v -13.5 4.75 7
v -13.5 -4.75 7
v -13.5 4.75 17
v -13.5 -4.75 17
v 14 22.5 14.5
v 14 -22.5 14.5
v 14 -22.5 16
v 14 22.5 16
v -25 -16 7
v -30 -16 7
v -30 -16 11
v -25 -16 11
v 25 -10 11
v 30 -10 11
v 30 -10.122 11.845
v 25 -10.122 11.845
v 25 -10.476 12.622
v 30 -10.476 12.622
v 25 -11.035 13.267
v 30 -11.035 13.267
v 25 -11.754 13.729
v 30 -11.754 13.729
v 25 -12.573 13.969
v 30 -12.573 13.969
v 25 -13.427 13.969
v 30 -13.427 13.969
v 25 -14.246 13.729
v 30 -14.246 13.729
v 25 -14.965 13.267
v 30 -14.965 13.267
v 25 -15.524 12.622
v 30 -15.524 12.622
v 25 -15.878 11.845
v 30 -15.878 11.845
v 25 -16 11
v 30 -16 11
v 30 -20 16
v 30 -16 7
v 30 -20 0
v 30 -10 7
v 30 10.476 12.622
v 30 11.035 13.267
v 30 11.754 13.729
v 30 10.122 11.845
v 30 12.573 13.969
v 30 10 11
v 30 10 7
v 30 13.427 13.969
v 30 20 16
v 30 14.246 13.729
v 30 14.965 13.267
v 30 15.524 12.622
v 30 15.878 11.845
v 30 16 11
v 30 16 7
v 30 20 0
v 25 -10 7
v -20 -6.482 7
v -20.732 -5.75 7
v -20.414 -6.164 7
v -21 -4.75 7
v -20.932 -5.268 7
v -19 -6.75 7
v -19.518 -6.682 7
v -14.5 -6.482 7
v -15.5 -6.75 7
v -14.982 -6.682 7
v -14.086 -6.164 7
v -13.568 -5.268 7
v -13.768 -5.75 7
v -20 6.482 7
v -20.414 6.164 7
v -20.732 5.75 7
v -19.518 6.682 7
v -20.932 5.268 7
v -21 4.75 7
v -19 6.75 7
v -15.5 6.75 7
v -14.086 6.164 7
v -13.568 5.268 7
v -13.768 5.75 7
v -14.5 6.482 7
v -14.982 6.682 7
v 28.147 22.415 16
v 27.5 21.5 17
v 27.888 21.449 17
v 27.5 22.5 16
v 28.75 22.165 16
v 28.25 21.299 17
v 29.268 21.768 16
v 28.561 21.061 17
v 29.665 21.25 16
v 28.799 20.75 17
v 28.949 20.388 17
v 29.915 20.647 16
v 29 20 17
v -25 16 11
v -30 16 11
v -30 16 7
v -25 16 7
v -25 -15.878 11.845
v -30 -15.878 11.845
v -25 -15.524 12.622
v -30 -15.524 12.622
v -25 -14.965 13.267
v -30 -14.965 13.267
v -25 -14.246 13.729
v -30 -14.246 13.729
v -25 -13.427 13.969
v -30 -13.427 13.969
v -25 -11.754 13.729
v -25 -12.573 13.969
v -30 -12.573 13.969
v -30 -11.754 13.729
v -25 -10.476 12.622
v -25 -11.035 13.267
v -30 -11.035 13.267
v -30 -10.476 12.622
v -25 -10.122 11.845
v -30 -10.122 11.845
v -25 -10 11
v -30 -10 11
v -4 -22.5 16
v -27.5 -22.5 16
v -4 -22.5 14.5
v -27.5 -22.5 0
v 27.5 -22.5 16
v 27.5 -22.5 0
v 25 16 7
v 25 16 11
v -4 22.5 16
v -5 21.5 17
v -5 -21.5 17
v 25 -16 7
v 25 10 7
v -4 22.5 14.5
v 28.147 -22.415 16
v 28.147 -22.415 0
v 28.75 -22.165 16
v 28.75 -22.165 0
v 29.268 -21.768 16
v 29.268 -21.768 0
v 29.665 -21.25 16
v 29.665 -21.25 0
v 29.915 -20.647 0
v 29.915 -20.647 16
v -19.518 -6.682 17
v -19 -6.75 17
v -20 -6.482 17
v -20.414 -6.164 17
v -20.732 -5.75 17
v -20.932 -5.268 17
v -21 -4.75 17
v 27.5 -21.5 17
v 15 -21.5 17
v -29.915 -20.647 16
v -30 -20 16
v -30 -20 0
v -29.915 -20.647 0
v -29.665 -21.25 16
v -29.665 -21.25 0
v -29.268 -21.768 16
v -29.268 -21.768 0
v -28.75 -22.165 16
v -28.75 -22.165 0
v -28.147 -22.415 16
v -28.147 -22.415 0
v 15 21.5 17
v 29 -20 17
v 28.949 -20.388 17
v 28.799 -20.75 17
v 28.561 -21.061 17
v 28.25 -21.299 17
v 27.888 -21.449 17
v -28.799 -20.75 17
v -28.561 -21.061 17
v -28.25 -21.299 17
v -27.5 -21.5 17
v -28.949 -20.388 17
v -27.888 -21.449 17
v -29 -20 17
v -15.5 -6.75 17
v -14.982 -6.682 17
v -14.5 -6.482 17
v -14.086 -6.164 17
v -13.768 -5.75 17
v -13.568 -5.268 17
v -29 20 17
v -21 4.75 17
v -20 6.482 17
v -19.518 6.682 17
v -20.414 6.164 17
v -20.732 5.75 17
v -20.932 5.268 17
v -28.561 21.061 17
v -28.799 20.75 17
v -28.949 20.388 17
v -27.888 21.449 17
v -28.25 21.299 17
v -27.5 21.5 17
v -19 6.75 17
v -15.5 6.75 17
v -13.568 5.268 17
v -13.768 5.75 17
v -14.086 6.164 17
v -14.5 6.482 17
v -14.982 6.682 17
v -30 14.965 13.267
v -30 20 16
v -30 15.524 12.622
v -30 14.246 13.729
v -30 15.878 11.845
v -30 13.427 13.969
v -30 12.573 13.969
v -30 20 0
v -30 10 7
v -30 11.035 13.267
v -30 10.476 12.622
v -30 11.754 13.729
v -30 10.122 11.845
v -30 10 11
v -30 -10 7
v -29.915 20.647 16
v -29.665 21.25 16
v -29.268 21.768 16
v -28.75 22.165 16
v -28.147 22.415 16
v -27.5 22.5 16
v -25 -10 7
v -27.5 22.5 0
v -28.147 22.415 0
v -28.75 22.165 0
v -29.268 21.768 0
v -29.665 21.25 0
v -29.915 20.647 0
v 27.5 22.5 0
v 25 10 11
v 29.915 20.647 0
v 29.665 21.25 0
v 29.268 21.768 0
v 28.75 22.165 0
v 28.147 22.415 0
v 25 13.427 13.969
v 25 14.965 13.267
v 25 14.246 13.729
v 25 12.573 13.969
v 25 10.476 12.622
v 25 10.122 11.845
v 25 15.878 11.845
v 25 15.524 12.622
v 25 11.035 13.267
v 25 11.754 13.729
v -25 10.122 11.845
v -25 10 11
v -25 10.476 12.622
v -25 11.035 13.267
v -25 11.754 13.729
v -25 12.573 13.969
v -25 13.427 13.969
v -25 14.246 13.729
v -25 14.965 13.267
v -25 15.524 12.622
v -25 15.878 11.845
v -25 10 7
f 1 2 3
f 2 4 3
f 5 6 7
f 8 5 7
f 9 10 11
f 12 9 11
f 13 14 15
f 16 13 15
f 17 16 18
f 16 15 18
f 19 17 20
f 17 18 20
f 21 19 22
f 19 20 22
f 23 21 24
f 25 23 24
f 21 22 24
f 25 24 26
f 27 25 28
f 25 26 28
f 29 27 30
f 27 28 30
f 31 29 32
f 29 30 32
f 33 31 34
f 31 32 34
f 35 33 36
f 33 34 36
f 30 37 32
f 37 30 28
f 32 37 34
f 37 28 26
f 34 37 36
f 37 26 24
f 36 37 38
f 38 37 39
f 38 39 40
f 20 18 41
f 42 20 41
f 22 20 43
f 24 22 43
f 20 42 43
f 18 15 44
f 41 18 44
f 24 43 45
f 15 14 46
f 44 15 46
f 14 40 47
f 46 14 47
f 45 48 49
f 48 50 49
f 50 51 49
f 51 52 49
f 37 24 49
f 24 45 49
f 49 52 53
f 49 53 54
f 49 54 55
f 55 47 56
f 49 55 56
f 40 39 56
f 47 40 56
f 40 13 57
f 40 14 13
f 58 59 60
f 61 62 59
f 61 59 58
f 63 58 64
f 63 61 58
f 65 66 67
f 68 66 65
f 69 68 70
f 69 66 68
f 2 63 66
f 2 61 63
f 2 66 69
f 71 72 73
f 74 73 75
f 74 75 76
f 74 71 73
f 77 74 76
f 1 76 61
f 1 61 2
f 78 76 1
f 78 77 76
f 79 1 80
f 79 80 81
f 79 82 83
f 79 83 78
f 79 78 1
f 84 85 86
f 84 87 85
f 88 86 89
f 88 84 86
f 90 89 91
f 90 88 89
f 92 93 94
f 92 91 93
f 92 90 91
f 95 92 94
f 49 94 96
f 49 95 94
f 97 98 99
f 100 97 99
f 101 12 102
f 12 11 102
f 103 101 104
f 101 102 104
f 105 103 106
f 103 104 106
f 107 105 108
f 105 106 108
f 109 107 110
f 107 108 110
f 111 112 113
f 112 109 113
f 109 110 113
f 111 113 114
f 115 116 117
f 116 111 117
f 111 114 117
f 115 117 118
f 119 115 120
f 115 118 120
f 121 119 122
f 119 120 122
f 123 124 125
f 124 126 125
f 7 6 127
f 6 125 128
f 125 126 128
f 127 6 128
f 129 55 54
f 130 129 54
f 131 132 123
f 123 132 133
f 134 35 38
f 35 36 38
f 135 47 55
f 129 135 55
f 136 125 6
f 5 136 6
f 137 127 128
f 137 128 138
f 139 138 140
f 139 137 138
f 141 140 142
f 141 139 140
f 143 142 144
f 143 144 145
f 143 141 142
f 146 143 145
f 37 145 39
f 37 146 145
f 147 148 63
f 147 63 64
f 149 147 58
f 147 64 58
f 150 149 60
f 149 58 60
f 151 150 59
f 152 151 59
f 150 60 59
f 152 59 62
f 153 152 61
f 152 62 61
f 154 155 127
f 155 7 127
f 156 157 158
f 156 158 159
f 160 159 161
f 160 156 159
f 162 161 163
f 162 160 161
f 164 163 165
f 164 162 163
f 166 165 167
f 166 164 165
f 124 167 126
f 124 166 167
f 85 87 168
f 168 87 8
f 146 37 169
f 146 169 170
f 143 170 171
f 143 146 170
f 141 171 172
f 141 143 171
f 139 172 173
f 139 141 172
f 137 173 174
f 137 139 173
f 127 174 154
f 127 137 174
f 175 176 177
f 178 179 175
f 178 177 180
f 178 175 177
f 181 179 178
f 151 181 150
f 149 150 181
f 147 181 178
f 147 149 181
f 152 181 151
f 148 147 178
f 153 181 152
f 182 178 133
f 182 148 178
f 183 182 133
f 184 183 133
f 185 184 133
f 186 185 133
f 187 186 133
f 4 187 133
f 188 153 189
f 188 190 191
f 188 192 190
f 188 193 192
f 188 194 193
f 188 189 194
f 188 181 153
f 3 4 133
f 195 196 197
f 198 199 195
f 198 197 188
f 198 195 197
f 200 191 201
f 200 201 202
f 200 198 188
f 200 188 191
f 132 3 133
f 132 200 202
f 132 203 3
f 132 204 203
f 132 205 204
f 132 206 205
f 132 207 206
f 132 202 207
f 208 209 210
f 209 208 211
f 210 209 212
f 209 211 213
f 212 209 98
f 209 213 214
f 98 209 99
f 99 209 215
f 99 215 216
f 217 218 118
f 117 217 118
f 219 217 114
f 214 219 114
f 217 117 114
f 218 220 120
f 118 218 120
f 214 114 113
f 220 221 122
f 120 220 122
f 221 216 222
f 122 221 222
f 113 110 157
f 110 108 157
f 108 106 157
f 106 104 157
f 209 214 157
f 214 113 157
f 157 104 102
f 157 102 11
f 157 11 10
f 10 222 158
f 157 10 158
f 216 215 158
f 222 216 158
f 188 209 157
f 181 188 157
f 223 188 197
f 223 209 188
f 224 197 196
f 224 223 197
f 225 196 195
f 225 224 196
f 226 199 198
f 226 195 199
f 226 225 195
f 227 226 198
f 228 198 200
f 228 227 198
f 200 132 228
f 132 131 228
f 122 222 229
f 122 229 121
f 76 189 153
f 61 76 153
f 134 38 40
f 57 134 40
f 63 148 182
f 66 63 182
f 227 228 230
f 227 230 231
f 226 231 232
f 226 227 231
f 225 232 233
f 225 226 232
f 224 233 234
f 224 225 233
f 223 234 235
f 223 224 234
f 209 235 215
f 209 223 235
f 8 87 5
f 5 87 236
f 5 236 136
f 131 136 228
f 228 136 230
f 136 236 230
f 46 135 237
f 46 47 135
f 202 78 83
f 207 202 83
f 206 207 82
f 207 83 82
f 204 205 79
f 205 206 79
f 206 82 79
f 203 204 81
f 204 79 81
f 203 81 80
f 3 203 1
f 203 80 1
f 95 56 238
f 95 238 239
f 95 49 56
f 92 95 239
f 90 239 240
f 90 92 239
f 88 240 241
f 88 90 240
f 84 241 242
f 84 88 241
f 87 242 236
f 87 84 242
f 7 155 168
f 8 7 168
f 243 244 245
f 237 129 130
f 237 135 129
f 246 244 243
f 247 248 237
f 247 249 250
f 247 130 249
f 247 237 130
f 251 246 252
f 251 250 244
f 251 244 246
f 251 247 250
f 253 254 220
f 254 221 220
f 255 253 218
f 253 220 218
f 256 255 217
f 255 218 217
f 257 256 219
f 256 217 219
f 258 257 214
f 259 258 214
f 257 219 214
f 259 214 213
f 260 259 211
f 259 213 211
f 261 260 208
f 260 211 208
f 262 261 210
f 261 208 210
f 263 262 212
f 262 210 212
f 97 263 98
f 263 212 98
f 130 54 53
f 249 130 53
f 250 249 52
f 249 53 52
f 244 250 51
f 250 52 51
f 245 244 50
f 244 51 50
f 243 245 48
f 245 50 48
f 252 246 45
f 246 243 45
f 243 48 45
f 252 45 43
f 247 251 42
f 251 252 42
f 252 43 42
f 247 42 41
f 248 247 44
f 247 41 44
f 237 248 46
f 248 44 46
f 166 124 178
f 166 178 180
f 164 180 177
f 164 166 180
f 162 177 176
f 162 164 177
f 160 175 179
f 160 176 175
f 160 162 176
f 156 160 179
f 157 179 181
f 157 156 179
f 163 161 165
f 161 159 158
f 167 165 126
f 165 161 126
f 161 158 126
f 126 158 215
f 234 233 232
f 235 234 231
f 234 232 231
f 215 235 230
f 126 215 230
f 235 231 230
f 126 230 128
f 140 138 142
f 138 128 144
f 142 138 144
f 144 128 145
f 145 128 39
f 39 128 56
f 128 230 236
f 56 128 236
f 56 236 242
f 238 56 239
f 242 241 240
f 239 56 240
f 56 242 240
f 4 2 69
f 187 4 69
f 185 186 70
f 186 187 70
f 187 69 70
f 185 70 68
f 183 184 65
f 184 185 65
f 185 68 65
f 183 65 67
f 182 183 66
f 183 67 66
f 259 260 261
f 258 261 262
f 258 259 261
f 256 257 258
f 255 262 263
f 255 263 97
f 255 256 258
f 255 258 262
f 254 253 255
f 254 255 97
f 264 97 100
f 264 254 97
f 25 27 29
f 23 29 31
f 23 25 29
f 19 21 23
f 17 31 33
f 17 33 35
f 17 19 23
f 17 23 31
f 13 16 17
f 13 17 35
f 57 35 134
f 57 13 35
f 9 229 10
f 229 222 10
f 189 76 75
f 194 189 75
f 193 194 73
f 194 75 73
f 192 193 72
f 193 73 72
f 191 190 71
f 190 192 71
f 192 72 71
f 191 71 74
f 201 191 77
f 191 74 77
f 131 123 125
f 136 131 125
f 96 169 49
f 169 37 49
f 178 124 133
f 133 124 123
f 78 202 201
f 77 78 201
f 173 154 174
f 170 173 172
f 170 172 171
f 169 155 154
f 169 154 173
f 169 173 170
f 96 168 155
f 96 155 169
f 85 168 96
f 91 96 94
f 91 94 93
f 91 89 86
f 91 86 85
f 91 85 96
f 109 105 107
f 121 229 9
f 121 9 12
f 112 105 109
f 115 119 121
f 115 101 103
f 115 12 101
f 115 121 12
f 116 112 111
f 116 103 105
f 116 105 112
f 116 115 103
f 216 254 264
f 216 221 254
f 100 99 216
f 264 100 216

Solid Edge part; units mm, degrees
sketch "Sketch1" plane through (0, 0, 0) normal (0, 0, 1) x (1, 0, 0)
  line L0 (-30, -22.5) -> (30, -22.5)
  line L1 (30, -22.5) -> (30, 22.5)
  line L2 (30, 22.5) -> (-30, 22.5)
  line L3 (-30, 22.5) -> (-30, -22.5)
  dimension "D1" = 60
  dimension "D2" = 45
extrude "Protrusion1" add sketch "Sketch1" along normal blind 17
fillet "Verrundung_1" radius 2.5 4 edges at (-30, 22.5, 8.5) (30, 22.5, 8.5) (30, -22.5, 8.5) (-30, -22.5, 8.5)
chamfer "Fase_1" distance 1 angle 45 7 edges at (30, 0, 17) (0, 22.5, 17) (-29.2678, 21.7678, 17) (-30, 0, 17) (-29.2678, -21.7678, 17) (0, -22.5, 17) (29.2678, -21.7678, 17)
sketch "Sketch2" plane through (-30, 0, 4.75) normal (-1, 0, 0) x (0, 0, 1)
  line L0 (6.25, 16) -> (2.25, 16)
  line L1 (2.25, 16) -> (2.25, 10)
  line L2 (6.25, 10) -> (2.25, 10)
  arc A0 (6.25, 10) -> (6.25, 16) centre (6.25, 13) ccw
extrude "ExtrudedCutout_5" cut sketch "Sketch2" against normal blind 5
mirror "Mirror1" about plane through (0, 0, 0) normal (0, -1, 0) of "ExtrudedCutout_5"
mirror "Mirror2" about plane through (0, 0, 0) normal (1, 0, 0) of "Mirror1", "ExtrudedCutout_5"
sketch "Sketch3" plane through (0, -22.5, 4.75) normal (0, -1, 0) x (1, 0, 0)
  line L0 (-4, 12.25) -> (-4, 9.75)
  line L1 (-4, 9.75) -> (14, 9.75)
  line L2 (14, 9.75) -> (14, 12.25)
  dimension "D1" = 18
  dimension "D2" = 2.5
  dimension "D3" = 16
extrude "ExtrudedCutout_7" cut sketch "Sketch3" against normal blind 55.5038 material side at (-3.95, -22.5, 15.75)
chamfer "Chamfer_3" distance 1 angle 45 2 edges at (14, 0, 17) (-4, 0, 17)
sketch "Sketch4" plane through (-17, 0, 17) normal (0, 0, 1) x (1, 0, 0)
  line L0 (-4, -6.75) -> (3.5, -6.75)
  line L1 (3.5, -6.75) -> (3.5, 6.75)
  line L2 (3.5, 6.75) -> (-4, 6.75)
  line L3 (-4, 6.75) -> (-4, -6.75)
  dimension "D1" = 9
  dimension "D2" = 7.5
  dimension "D3" = 13.5
extrude "ExtrudedCutout_8" cut sketch "Sketch4" against normal blind 10
fillet "Round_3" radius 2 4 edges at (-21, 6.75, 12) (-13.5, 6.75, 12) (-13.5, -6.75, 12) (-21, -6.75, 12)
